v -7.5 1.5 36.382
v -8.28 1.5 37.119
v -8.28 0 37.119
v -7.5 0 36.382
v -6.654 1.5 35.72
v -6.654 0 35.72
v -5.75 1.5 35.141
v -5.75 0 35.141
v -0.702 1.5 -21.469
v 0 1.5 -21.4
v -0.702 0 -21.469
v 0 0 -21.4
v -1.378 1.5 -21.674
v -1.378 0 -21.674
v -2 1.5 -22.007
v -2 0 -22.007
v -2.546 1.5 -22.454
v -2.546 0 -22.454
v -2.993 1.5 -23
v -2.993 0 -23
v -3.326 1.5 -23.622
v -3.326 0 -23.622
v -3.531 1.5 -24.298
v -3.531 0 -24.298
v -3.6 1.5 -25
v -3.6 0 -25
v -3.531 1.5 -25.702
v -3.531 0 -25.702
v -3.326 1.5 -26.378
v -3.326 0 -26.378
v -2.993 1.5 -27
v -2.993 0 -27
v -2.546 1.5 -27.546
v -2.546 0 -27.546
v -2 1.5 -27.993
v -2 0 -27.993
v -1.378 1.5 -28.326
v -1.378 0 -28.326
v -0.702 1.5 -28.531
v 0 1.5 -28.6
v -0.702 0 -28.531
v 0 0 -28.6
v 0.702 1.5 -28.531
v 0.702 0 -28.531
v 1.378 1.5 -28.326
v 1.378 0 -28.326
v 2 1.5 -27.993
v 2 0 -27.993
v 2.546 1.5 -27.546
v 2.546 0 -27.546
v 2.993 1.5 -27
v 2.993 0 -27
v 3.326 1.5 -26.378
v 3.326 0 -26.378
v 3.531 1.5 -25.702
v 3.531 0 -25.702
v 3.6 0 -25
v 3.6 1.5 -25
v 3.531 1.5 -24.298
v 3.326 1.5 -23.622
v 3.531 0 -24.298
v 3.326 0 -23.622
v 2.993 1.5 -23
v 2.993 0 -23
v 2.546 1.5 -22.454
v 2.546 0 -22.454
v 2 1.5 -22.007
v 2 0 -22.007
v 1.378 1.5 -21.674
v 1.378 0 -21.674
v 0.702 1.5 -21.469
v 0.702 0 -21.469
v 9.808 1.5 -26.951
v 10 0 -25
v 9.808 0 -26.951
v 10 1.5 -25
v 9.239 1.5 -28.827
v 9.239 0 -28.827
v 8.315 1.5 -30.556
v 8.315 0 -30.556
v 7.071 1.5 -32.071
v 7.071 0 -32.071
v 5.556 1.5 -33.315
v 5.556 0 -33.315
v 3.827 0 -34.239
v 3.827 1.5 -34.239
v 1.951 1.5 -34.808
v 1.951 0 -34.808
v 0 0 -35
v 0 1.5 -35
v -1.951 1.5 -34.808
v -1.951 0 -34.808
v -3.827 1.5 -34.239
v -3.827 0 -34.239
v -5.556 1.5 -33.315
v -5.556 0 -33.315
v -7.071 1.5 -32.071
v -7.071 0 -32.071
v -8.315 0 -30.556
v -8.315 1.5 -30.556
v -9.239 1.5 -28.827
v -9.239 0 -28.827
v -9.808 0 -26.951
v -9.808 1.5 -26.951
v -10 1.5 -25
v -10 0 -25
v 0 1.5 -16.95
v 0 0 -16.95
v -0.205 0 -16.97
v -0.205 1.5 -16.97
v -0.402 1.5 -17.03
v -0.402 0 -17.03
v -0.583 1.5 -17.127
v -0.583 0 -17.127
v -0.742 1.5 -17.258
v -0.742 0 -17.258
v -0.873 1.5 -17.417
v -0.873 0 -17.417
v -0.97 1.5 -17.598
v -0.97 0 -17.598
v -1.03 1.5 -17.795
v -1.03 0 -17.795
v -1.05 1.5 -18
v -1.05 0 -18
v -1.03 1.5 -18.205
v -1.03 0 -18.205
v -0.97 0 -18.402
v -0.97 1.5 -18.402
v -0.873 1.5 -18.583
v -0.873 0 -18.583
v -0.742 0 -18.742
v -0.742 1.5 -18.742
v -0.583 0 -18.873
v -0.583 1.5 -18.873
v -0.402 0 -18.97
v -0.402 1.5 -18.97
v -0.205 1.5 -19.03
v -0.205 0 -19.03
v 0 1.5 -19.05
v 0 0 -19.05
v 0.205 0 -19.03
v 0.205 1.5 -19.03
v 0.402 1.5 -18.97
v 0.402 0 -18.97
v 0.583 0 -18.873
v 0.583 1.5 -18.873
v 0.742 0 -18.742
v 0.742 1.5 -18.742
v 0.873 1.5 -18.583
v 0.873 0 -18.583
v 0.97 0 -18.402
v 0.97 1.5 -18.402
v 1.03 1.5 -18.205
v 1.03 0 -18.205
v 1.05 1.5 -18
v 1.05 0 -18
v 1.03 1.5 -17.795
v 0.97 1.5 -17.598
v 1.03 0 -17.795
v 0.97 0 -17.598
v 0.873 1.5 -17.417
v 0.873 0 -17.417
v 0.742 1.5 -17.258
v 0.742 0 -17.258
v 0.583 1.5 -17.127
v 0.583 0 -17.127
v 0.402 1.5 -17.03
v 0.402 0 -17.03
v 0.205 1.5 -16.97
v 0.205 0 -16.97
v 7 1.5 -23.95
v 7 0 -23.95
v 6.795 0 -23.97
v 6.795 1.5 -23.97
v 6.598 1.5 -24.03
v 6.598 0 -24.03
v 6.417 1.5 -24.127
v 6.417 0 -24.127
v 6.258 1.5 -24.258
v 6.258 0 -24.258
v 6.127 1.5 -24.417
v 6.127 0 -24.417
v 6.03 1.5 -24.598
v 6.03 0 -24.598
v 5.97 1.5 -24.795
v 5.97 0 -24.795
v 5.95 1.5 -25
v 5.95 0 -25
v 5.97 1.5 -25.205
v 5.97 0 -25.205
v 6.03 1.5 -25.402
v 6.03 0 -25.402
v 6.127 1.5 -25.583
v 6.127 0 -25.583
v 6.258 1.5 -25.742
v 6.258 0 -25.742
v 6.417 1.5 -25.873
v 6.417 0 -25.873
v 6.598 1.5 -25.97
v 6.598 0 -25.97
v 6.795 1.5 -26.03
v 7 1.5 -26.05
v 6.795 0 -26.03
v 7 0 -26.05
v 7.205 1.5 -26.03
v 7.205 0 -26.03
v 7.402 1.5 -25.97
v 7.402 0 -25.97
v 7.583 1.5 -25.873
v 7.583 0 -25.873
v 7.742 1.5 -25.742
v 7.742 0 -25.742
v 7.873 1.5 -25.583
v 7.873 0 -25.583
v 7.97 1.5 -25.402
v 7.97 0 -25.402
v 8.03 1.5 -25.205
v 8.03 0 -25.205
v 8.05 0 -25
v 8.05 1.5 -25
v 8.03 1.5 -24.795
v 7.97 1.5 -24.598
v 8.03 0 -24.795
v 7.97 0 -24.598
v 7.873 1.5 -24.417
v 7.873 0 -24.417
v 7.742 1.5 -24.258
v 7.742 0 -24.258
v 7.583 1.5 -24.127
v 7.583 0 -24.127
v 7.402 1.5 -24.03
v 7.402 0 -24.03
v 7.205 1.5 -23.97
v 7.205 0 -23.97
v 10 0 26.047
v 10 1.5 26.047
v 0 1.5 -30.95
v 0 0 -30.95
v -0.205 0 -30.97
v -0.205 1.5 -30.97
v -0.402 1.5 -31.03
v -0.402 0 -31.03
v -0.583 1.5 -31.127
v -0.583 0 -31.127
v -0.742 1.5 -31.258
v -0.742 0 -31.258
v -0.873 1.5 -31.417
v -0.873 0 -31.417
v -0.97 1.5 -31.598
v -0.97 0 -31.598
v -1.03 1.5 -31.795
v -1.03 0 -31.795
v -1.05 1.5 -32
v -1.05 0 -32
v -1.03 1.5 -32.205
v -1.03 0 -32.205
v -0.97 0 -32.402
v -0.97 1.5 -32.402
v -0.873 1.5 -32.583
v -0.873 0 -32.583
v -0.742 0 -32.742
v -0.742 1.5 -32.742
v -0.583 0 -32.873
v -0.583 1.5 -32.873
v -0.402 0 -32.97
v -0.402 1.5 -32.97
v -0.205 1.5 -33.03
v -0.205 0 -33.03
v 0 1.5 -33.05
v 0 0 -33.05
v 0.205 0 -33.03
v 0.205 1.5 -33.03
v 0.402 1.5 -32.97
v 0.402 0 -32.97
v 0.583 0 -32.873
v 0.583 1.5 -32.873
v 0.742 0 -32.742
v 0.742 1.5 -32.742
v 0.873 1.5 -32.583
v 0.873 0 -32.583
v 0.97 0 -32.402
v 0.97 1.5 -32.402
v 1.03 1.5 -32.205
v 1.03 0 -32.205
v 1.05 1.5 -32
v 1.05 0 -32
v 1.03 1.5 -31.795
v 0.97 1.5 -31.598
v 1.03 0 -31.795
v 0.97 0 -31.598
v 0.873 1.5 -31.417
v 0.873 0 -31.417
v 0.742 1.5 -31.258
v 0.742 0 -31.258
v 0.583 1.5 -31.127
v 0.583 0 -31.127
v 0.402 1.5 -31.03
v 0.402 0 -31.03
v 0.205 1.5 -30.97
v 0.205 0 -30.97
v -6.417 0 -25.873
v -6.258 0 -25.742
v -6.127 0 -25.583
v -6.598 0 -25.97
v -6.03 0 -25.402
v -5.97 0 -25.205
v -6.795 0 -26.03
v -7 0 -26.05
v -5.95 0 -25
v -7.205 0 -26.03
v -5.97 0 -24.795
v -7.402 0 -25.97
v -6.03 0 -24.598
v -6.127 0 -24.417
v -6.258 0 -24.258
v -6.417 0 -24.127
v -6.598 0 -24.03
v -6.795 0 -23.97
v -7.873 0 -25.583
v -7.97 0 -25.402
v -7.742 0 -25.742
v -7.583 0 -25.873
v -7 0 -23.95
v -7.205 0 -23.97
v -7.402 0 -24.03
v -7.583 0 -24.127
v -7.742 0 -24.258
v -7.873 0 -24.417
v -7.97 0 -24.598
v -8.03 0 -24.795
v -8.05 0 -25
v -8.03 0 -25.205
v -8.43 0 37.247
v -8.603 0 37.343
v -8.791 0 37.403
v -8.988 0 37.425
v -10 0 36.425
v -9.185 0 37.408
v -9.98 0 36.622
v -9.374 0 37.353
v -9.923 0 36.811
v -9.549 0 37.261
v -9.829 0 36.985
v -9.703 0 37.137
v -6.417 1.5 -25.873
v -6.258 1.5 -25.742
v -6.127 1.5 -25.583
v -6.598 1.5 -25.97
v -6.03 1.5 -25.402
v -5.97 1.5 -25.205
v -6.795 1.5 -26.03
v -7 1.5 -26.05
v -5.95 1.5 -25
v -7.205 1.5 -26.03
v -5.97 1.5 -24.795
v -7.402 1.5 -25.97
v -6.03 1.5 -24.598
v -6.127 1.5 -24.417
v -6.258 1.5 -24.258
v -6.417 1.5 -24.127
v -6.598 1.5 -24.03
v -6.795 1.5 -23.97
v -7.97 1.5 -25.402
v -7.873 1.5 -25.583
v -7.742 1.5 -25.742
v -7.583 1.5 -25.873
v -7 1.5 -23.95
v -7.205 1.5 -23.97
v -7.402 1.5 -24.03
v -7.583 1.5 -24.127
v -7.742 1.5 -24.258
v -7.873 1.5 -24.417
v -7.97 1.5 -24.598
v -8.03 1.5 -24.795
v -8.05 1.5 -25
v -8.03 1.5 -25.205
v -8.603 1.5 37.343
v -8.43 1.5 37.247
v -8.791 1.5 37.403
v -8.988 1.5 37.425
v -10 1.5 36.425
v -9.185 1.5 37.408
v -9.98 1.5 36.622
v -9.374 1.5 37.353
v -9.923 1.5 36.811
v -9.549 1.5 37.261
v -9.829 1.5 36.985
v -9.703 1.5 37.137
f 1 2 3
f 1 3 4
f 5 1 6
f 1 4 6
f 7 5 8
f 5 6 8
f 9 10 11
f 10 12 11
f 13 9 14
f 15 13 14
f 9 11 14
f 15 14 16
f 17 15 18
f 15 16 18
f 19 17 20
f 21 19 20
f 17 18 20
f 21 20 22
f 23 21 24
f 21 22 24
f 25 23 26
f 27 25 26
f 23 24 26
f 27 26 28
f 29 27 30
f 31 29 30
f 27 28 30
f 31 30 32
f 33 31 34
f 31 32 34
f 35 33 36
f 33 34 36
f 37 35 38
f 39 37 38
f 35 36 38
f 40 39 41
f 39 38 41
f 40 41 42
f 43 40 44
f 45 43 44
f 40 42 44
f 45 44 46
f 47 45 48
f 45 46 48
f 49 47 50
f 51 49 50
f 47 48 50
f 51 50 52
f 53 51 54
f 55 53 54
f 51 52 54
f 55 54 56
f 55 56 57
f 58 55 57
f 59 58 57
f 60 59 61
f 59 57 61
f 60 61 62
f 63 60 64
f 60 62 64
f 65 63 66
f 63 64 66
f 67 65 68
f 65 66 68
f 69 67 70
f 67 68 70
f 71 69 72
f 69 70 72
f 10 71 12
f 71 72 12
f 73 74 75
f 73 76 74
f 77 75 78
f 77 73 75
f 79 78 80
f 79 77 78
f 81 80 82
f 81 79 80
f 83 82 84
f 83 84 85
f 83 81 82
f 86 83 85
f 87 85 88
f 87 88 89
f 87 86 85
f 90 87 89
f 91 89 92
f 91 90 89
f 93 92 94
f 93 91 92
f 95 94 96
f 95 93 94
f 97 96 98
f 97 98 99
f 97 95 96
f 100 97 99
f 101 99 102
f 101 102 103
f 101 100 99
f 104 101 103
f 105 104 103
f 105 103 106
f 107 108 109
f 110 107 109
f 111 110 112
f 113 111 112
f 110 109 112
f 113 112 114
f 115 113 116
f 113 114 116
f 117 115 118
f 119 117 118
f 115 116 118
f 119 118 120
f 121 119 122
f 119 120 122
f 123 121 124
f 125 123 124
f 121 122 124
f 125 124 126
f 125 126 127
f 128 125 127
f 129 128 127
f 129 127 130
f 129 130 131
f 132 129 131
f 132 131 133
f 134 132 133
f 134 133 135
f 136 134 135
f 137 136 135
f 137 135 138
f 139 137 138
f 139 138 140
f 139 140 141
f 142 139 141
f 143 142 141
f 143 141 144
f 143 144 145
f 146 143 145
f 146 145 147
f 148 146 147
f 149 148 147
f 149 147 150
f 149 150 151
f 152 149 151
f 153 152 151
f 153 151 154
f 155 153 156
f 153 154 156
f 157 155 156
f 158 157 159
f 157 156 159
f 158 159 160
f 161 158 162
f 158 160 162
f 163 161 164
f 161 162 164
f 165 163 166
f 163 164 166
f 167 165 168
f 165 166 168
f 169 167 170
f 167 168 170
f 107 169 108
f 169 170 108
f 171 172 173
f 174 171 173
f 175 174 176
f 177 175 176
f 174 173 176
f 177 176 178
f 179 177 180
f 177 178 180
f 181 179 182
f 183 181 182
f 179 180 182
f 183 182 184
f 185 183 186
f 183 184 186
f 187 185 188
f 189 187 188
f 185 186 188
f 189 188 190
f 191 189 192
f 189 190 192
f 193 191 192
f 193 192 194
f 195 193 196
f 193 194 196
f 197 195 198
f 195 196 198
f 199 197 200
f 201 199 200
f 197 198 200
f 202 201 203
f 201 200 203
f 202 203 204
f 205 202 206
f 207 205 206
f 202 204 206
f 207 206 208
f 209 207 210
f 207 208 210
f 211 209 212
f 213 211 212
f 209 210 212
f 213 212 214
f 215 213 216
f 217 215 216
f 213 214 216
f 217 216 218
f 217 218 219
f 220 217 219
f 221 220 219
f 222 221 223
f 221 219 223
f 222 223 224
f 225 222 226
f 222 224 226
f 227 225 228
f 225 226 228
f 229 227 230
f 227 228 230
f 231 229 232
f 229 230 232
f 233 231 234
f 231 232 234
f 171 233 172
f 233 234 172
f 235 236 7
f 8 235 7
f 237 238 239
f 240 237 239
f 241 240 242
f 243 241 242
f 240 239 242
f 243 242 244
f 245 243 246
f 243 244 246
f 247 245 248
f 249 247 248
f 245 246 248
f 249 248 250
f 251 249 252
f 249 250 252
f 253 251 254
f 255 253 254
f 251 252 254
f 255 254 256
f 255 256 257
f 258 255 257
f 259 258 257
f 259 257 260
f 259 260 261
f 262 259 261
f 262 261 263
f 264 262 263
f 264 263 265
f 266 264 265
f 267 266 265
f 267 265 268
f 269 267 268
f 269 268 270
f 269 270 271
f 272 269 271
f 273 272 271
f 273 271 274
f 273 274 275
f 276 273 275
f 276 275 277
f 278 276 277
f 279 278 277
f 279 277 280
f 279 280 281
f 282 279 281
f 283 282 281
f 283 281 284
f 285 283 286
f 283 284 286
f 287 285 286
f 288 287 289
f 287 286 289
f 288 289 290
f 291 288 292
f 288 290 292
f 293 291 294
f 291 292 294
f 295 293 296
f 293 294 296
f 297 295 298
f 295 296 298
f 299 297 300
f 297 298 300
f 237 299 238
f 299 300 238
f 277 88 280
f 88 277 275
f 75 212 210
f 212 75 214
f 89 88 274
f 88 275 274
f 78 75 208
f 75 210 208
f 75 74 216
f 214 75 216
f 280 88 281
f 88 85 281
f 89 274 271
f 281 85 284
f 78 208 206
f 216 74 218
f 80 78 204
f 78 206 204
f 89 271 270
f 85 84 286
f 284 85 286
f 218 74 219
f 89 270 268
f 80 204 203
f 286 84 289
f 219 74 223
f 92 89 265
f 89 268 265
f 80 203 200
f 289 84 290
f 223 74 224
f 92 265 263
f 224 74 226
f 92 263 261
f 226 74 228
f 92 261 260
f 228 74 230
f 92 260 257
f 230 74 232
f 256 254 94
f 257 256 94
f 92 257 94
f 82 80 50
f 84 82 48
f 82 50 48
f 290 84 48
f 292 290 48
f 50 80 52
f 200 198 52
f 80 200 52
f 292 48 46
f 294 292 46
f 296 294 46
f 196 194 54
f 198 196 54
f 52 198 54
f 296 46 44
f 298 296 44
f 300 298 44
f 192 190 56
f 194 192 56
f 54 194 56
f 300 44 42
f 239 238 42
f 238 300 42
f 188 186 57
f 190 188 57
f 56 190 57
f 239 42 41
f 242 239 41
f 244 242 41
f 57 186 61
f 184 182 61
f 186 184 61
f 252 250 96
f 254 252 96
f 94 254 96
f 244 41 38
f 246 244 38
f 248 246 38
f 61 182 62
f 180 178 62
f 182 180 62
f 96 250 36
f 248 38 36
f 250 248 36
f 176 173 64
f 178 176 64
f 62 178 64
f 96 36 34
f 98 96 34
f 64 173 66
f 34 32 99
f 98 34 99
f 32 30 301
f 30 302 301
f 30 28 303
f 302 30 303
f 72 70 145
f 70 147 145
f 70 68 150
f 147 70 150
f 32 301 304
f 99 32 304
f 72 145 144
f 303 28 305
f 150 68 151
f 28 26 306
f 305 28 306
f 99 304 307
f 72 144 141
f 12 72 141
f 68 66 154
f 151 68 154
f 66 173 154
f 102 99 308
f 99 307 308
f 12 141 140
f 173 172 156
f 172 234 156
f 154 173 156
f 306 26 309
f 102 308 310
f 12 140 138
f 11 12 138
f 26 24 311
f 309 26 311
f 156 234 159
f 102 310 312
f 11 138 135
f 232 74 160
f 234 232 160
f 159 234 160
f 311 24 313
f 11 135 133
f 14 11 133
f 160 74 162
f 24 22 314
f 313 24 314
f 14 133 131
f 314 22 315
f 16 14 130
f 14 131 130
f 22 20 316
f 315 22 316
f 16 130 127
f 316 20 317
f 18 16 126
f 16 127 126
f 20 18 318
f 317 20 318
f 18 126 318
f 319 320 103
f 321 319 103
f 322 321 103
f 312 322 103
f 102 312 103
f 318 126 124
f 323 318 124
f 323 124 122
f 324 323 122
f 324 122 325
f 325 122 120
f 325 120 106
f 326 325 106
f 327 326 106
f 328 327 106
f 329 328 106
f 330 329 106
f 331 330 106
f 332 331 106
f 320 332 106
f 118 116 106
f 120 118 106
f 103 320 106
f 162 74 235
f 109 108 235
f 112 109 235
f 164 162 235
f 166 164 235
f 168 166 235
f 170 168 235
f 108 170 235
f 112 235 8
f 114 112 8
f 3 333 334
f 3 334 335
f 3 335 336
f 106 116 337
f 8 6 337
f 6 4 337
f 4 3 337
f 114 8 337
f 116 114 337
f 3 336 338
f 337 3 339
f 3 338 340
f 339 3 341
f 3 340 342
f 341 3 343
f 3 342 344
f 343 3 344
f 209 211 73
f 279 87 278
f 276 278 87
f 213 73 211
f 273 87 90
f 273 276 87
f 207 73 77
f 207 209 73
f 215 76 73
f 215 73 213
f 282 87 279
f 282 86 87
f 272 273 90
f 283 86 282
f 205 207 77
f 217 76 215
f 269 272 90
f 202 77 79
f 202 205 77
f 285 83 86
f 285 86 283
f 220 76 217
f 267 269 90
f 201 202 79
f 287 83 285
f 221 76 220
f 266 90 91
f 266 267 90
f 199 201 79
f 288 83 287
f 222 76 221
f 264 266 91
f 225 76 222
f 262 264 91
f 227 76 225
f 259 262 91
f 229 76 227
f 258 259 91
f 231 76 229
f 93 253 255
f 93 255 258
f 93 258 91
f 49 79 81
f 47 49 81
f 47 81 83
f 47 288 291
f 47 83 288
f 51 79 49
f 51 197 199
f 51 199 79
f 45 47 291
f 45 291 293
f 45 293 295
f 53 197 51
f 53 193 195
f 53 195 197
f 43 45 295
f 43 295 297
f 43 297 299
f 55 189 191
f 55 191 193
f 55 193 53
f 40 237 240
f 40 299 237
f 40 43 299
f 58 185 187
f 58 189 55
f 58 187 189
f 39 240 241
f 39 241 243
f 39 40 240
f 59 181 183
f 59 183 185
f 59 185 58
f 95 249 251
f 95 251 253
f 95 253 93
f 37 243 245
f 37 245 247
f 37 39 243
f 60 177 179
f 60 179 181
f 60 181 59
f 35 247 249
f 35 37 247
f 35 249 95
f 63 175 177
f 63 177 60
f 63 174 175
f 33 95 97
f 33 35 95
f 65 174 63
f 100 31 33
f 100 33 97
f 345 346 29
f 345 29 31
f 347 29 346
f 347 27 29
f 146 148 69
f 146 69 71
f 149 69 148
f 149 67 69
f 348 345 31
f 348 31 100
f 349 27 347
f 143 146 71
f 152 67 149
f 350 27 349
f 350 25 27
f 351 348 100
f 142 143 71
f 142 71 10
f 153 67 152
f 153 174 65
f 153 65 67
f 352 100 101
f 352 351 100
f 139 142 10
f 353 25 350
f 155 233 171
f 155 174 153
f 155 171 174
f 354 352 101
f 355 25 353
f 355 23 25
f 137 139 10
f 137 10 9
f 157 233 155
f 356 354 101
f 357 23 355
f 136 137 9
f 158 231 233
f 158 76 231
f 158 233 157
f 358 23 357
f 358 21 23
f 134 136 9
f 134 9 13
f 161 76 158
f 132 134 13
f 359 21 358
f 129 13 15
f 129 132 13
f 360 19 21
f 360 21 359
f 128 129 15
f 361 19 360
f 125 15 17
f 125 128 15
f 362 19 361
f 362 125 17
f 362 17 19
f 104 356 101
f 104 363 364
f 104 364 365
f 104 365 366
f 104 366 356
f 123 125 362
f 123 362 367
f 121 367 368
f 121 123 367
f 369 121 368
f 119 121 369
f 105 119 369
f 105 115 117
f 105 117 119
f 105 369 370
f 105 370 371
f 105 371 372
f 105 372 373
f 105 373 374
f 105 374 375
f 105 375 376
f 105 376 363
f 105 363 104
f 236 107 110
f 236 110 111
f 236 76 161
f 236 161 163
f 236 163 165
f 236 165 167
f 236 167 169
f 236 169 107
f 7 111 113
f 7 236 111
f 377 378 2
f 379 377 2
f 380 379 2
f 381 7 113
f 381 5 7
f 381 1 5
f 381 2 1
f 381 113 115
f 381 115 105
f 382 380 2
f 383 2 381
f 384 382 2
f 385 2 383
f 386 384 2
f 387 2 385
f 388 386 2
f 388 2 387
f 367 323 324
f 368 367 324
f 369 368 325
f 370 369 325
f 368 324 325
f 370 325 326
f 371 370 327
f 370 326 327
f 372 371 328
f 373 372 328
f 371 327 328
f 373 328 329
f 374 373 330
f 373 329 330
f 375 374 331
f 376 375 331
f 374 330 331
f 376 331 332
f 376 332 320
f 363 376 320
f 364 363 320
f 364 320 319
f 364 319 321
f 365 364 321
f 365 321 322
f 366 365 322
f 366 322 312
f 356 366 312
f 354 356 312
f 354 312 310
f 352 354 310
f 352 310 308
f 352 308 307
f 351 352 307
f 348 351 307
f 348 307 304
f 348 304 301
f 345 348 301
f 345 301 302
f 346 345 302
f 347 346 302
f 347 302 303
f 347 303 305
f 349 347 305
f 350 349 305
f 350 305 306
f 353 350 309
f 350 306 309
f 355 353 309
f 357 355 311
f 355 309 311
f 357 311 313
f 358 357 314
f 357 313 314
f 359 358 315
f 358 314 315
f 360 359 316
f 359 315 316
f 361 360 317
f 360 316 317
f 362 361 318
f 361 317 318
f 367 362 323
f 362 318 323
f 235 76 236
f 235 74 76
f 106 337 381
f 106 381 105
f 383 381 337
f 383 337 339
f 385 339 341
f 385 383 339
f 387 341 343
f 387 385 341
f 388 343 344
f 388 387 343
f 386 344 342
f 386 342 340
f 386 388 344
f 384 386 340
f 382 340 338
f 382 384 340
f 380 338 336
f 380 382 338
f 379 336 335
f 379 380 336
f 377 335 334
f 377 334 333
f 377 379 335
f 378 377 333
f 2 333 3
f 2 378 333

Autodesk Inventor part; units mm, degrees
ref_plane "YZ Plane" through (0, 0, 0) normal (1, 0, 0) x (0, 1, 0)
ref_plane "XZ Plane" through (0, 0, 0) normal (0, 1, 0) x (-1, 0, 0)
ref_plane "XY Plane" through (0, 0, 0) normal (0, 0, 1) x (1, 0, 0)
sketch "Sketch1" plane through (0, 0, 0) normal (0, 1, 0) x (-1, 0, 0)
  line L0 (10, -35) -> (-10, -35)
  line L1 (-10, -35) -> (-10, 39.4211)
  line L2 (10, 39.4211) -> (10, -35)
  arc A0 (-10, 39.4211) -> (10, 39.4211) centre (0, 45.1) ccw
  point P0 (0, 0)
  dimension "d2" = 35
  dimension "d3" = 10
  dimension "d36" = 23
  dimension "d37" = 80.1
  dimension "d39" = 74.4211
  dimension "d40" = 20
extrude "Plate1" add sketch "Sketch1" along normal blind 1.5
sketch "Sketch3" plane through (0, 1.5, 0) normal (0, 1, 0) x (1, 0, 0)
  circle A0 centre (0, 25) radius 10
  circle A1 centre (0, -25) radius 10
  line L0 (-10, 35) -> (10, 35) projected
  line L1 (10, -44) -> (-10, -44) projected
  line L2 (-10, 35) -> (10, 35)
  line L3 (10, 35) -> (10, 25)
  line L4 (10, 25) -> (-10, 25)
  line L5 (-10, 25) -> (-10, 35)
  line L6 (10, -35) -> (-10, -35)
  line L7 (-10, -35) -> (-10, -25)
  line L8 (-10, -25) -> (10, -25)
  line L9 (10, -25) -> (10, -44)
  point P0 (0, 0)
  point P1 (-10, -39.4211)
  point P2 (10, -25)
  point P3 (0, -35)
  point P4 (-10, -35)
  point P5 (0, 35)
  point P6 (10, 35)
  dimension "d12" = 20
  dimension "d13" = 20
  dimension "d14" = 10
  dimension "d15" = 10
  dimension "d16" = 25
  dimension "d17" = 25
  dimension "d18" = 10
extrude "Extrusion1" cut sketch "Sketch3" against normal blind 10 contours L5 L0 A0 | A0 L0 L3
sketch "Sketch4" plane through (0, 1.5, 0) normal (0, 1, 0) x (1, 0, 0)
  circle A0 centre (-7, 25) radius 0.8
  arc A1 (10, 25) -> (-10, 25) centre (0, 25) ccw projected
  circle A2 centre (0, 18) radius 0.8
  circle A3 centre (7, 25) radius 0.8
  circle A4 centre (0, 32) radius 0.8
  point P0 (0, 0)
  dimension "d21" = 0
  dimension "d22" = 7
  dimension "d23" = 1.6
  dimension "d26" = 360
hole "Hole2" at (0, 1.5, -32) at (7, 1.5, -25) at (0, 1.5, -18) at (-7, 1.5, -25) direction (0, -1, 0) diameter 2.1 depth 1.5
fillet "Fillet1" radius 1 2 edges at (-10, 0.75, 39.4211) (10, 0.75, 39.4211)
sketch "Sketch5" plane through (0, 1.5, 0) normal (0, 1, 0) x (1, 0, 0)
  arc A0 (10, 25) -> (-10, 25) centre (0, 25) ccw projected
  point P0 (0, 0)
hole "Hole3" at (0, 1.5, -25) direction (0, -1, 0) diameter 7.2 depth 1.5
sketch "Sketch8" plane through (0, 1.5, 0) normal (0, 1, 0) x (1, 0, 0)
  line L0 (19.8447, -20.3636) -> (-14.9774, -40.4682)
  arc A0 (8.28, -37.1193) -> (-8.28, -37.1193) centre (0, -45.1) ccw projected
  arc A1 (8.28, -37.1193) -> (10, -36.4253) centre (9, -36.4253) ccw projected
  line L1 (10, 25) -> (10, -36.4253) projected
  point P0 (0, 0)
  point P1 (10, -26.0474)
  point P2 (-5.75, -35.1407)
  dimension "d63" = 60
extrude "Extrusion2" cut sketch "Sketch8" against normal blind 1.5
equation "\"d33\" = Thickness"
equation "\"d47\" = Thickness"
equation "\"d4\" = Thickness"
equation "\"BendReliefWidth\" = Thickness"
equation "\"BendReliefDepth\" = 0.5 * Thickness"
equation "\"CornerReliefSize\" = 4 * Thickness"
equation "\"MinimumRemnant\" = 2 * Thickness"
equation "\"TransitionRadius\" = BendRadius"
equation "\"JacobiRadiusSize\" = BendRadius"
equation "\"GapSize\" = Thickness"
equation "\"Thickness\" = 1.5"
equation "\"BendRadius\" = 0.31"
properties part number "axis_8_10_connector_frame" material "Aluminum 6061-AHC"
